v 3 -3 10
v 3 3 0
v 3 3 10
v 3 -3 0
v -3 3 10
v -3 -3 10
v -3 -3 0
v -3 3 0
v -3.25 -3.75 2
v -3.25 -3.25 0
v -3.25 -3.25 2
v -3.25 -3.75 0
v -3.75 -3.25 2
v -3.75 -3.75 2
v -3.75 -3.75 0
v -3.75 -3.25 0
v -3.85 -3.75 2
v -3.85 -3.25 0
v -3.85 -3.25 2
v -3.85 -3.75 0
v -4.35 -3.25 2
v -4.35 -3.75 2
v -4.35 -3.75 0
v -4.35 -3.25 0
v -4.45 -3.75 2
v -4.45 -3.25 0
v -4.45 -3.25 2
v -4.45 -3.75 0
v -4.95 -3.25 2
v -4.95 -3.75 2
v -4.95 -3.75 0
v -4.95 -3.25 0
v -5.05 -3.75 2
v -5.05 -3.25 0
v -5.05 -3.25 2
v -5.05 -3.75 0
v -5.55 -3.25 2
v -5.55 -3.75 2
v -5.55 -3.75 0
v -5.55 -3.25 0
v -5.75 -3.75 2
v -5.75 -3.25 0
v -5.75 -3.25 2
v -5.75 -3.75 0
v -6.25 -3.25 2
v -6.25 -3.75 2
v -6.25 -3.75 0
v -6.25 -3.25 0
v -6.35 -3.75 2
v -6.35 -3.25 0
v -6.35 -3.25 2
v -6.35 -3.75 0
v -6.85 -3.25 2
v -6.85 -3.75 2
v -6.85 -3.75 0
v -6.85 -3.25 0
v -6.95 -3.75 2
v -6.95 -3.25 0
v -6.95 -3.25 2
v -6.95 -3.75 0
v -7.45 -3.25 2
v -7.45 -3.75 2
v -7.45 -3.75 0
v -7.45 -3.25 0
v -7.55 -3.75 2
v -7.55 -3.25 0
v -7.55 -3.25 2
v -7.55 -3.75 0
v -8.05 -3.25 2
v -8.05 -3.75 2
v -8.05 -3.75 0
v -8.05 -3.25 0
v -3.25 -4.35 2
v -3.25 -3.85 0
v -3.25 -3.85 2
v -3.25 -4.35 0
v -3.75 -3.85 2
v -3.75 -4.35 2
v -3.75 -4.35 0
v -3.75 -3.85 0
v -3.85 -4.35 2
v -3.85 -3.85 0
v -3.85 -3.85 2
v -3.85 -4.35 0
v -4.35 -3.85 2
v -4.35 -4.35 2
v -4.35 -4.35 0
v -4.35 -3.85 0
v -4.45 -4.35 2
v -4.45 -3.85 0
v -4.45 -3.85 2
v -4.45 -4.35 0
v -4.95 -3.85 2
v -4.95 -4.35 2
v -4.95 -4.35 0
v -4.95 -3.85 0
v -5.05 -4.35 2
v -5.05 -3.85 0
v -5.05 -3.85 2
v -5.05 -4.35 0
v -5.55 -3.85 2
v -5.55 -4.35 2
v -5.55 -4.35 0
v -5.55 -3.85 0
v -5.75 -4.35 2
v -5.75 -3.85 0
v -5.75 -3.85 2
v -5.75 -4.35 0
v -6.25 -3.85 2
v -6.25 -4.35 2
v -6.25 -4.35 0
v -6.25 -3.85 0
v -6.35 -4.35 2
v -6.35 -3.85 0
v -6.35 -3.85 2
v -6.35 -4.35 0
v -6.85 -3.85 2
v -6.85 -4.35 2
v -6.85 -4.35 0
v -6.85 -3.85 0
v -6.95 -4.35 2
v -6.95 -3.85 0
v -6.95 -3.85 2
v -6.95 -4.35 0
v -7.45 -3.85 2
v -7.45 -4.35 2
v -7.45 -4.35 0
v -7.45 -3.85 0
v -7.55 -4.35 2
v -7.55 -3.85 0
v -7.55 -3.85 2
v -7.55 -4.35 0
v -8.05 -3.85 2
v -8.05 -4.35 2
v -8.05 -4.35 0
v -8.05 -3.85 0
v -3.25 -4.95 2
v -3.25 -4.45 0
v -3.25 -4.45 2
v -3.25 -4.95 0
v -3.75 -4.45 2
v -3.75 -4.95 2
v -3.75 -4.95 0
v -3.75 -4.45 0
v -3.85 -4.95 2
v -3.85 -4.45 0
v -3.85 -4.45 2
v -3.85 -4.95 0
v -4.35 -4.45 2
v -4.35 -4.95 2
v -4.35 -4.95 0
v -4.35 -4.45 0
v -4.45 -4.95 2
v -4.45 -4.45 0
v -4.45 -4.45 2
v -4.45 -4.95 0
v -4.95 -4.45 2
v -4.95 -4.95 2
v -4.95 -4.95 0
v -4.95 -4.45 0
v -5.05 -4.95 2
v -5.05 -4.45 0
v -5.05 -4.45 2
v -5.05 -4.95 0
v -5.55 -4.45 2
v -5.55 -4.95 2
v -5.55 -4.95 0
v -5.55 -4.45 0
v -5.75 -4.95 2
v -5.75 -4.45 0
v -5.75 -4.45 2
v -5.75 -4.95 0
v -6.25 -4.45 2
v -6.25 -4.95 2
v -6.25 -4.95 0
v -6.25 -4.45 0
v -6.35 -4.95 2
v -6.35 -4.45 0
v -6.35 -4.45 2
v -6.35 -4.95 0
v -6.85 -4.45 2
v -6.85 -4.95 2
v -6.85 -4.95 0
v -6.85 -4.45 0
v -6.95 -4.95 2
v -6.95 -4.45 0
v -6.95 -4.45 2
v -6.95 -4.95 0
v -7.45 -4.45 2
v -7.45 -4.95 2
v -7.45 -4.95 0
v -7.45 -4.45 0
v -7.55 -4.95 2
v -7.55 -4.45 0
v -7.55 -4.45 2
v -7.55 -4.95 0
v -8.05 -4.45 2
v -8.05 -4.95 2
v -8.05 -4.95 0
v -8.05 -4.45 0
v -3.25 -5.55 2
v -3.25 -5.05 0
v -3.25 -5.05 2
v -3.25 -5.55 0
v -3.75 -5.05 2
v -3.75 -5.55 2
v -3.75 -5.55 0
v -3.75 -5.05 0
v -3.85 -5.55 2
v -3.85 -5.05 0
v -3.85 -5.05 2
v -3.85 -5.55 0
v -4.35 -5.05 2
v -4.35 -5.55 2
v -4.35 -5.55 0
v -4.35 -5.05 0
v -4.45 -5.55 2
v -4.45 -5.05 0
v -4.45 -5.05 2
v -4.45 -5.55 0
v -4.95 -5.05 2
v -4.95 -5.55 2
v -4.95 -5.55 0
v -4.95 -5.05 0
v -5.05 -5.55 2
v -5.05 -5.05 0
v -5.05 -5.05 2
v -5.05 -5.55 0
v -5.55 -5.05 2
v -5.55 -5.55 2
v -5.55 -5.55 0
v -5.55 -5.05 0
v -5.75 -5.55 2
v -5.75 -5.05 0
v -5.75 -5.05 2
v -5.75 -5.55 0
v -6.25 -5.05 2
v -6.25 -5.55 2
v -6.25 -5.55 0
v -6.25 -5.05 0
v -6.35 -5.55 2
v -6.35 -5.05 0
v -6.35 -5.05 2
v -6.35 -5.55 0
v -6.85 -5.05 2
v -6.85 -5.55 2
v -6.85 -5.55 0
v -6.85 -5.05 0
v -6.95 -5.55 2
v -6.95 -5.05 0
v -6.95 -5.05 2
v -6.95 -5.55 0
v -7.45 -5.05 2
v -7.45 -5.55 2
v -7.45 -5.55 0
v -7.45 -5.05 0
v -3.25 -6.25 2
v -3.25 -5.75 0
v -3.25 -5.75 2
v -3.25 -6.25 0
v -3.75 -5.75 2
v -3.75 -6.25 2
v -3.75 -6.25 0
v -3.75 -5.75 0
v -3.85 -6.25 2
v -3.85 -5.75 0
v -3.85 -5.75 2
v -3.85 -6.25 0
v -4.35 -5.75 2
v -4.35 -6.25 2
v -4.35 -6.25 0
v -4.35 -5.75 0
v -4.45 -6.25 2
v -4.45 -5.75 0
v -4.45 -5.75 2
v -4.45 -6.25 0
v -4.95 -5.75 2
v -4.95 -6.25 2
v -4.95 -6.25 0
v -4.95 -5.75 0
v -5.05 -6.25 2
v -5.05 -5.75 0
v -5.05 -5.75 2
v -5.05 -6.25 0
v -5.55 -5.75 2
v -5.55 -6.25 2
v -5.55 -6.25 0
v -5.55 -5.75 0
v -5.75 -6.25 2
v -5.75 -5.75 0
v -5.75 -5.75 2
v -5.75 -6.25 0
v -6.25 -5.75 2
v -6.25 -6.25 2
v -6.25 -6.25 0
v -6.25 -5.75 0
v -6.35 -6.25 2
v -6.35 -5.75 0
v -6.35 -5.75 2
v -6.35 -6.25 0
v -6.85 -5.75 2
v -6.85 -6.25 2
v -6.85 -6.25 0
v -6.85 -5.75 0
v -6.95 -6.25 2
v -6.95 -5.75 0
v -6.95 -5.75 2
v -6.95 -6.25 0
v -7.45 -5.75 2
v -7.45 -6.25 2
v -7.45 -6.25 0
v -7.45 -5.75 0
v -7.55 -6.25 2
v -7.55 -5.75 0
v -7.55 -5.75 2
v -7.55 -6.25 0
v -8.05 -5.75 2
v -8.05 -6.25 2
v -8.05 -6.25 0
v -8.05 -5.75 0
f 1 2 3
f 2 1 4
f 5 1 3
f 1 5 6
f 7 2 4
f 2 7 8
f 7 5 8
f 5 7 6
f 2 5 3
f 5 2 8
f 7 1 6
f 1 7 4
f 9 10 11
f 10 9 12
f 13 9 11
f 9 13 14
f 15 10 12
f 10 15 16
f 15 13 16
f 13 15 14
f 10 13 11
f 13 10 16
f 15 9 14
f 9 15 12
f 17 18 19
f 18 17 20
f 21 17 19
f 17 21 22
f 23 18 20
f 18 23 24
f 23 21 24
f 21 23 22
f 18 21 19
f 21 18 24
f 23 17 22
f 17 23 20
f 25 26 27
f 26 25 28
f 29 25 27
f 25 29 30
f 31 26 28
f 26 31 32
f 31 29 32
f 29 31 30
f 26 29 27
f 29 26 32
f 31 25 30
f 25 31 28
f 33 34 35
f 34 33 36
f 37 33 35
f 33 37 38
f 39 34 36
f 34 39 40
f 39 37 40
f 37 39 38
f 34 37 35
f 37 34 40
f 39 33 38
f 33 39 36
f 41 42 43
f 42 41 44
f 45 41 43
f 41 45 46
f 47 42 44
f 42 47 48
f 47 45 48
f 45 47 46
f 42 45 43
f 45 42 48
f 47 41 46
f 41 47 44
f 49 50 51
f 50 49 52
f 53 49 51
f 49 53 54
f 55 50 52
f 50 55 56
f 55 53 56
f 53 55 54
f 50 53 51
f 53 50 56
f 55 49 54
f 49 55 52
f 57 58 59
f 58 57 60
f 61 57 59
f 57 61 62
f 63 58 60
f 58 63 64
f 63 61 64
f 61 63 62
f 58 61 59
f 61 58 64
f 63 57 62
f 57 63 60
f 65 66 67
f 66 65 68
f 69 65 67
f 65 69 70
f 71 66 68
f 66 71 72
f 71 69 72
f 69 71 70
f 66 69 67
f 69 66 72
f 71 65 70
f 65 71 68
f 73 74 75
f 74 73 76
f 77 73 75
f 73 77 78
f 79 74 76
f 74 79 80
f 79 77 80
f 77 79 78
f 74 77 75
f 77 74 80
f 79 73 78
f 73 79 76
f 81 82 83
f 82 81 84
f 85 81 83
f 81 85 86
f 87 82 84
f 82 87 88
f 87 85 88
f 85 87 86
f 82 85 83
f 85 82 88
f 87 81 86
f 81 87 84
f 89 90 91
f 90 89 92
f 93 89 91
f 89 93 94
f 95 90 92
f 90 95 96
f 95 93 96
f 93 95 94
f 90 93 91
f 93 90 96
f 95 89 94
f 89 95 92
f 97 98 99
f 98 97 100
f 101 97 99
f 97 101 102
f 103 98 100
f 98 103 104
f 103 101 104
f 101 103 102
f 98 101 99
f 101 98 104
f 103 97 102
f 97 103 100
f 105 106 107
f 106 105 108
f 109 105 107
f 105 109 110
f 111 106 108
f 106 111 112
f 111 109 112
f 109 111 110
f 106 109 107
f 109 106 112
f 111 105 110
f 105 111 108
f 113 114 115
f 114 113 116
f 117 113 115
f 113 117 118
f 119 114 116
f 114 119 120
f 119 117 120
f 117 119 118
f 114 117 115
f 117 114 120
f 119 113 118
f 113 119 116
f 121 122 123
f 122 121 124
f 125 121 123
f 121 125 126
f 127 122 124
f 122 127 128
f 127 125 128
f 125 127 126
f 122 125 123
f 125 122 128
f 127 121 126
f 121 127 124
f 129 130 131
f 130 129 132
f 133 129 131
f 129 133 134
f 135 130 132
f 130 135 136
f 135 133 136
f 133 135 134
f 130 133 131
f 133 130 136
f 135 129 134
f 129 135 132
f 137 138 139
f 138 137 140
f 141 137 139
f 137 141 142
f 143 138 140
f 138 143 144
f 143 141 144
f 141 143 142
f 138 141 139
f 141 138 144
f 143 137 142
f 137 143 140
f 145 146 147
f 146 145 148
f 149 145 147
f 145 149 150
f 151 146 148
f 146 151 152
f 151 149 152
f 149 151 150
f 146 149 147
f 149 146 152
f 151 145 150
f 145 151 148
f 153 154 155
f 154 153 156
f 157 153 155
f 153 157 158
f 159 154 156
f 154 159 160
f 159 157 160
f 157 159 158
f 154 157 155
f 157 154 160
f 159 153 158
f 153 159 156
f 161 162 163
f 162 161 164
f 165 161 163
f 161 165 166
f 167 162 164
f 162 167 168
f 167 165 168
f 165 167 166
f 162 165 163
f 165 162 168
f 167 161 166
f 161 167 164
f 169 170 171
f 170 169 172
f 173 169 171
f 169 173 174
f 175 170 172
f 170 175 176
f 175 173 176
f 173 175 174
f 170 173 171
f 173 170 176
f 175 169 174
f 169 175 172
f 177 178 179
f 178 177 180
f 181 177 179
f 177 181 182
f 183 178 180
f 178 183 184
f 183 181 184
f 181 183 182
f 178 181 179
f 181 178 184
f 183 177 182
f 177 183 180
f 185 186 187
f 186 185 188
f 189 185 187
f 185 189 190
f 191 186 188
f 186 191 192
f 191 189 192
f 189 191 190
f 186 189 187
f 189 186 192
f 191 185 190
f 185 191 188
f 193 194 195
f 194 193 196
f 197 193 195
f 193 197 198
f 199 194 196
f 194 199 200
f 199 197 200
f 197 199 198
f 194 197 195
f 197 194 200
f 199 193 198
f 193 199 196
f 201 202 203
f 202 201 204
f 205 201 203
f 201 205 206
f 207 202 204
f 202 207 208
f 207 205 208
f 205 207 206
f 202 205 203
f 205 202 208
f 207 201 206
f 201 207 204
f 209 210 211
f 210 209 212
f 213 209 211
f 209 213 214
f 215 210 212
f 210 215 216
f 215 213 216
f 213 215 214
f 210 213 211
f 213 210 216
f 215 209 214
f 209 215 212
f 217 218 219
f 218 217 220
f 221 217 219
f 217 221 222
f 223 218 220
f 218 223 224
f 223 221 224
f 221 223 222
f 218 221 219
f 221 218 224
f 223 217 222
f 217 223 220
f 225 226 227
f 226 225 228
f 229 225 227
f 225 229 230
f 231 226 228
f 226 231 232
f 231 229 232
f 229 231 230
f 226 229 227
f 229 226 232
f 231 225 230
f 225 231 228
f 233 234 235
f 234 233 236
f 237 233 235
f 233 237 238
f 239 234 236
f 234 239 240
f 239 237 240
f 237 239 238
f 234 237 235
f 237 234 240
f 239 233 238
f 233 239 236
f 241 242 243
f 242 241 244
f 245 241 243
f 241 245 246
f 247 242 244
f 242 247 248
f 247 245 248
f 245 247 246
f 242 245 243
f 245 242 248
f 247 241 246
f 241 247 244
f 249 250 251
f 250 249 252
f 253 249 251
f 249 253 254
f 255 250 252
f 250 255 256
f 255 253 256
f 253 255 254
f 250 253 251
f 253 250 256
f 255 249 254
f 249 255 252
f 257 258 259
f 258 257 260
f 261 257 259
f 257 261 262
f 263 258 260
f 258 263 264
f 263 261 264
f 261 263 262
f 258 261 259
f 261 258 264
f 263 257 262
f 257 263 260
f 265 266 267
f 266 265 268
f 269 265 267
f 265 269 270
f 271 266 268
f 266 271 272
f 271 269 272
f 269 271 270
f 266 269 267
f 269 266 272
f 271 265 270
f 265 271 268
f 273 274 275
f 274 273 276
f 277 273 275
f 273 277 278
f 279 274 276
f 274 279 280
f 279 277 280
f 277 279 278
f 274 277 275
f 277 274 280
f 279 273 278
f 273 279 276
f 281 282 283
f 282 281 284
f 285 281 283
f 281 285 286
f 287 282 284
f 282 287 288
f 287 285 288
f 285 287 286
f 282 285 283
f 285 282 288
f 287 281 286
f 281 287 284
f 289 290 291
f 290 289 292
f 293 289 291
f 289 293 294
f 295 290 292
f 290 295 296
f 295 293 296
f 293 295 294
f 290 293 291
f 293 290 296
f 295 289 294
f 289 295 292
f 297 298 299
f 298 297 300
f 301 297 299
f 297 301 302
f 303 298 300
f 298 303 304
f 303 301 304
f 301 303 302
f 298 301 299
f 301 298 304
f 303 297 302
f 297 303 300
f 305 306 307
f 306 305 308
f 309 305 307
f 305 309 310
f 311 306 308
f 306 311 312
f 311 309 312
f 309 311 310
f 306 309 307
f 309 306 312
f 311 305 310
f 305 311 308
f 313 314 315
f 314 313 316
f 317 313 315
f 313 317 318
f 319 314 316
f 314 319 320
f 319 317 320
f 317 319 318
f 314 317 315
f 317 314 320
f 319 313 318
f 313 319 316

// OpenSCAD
translate([0, 0, 5]) color([0,1,0,0.9]) cube([6, 6, 10], center=true);
translate([-3.5, -3.5, 1]) color([1,0,0]) cube([0.5, 0.5, 2], center=true);
translate([-4.1, -3.5, 1]) color([1,0,0]) cube([0.5, 0.5, 2], center=true);
translate([-4.7, -3.5, 1]) color([1,0,0]) cube([0.5, 0.5, 2], center=true);
translate([-5.3, -3.5, 1]) color([1,0,0]) cube([0.5, 0.5, 2], center=true);
translate([-6.0, -3.5, 1]) color([1,0,0]) cube([0.5, 0.5, 2], center=true);
translate([-6.6, -3.5, 1]) color([1,0,0]) cube([0.5, 0.5, 2], center=true);
translate([-7.2, -3.5, 1]) color([1,0,0]) cube([0.5, 0.5, 2], center=true);
translate([-7.8, -3.5, 1]) color([1,0,0]) cube([0.5, 0.5, 2], center=true);
translate([-3.5, -4.1, 1]) color([1,0,0]) cube([0.5, 0.5, 2], center=true);
translate([-4.1, -4.1, 1]) color([1,0,0]) cube([0.5, 0.5, 2], center=true);
translate([-4.7, -4.1, 1]) color([1,0,0]) cube([0.5, 0.5, 2], center=true);
translate([-5.3, -4.1, 1]) color([1,0,0]) cube([0.5, 0.5, 2], center=true);
translate([-6.0, -4.1, 1]) color([1,0,0]) cube([0.5, 0.5, 2], center=true);
translate([-6.6, -4.1, 1]) color([1,0,0]) cube([0.5, 0.5, 2], center=true);
translate([-7.2, -4.1, 1]) color([1,0,0]) cube([0.5, 0.5, 2], center=true);
translate([-7.8, -4.1, 1]) color([1,0,0]) cube([0.5, 0.5, 2], center=true);
translate([-3.5, -4.7, 1]) color([1,0,0]) cube([0.5, 0.5, 2], center=true);
translate([-4.1, -4.7, 1]) color([1,0,0]) cube([0.5, 0.5, 2], center=true);
translate([-4.7, -4.7, 1]) color([1,0,0]) cube([0.5, 0.5, 2], center=true);
translate([-5.3, -4.7, 1]) color([1,0,0]) cube([0.5, 0.5, 2], center=true);
translate([-6.0, -4.7, 1]) color([1,0,0]) cube([0.5, 0.5, 2], center=true);
translate([-6.6, -4.7, 1]) color([1,0,0]) cube([0.5, 0.5, 2], center=true);
translate([-7.2, -4.7, 1]) color([1,0,0]) cube([0.5, 0.5, 2], center=true);
translate([-7.8, -4.7, 1]) color([1,0,0]) cube([0.5, 0.5, 2], center=true);
translate([-3.5, -5.3, 1]) color([1,0,0]) cube([0.5, 0.5, 2], center=true);
translate([-4.1, -5.3, 1]) color([1,0,0]) cube([0.5, 0.5, 2], center=true);
translate([-4.7, -5.3, 1]) color([1,0,0]) cube([0.5, 0.5, 2], center=true);
translate([-5.3, -5.3, 1]) color([1,0,0]) cube([0.5, 0.5, 2], center=true);
translate([-6.0, -5.3, 1]) color([1,0,0]) cube([0.5, 0.5, 2], center=true);
translate([-6.6, -5.3, 1]) color([1,0,0]) cube([0.5, 0.5, 2], center=true);
translate([-7.2, -5.3, 1]) color([1,0,0]) cube([0.5, 0.5, 2], center=true);
translate([-3.5, -6.0, 1]) color([1,0,0]) cube([0.5, 0.5, 2], center=true);
translate([-4.1, -6.0, 1]) color([1,0,0]) cube([0.5, 0.5, 2], center=true);
translate([-4.7, -6.0, 1]) color([1,0,0]) cube([0.5, 0.5, 2], center=true);
translate([-5.3, -6.0, 1]) color([1,0,0]) cube([0.5, 0.5, 2], center=true);
translate([-6.0, -6.0, 1]) color([1,0,0]) cube([0.5, 0.5, 2], center=true);
translate([-6.6, -6.0, 1]) color([1,0,0]) cube([0.5, 0.5, 2], center=true);
translate([-7.2, -6.0, 1]) color([1,0,0]) cube([0.5, 0.5, 2], center=true);
translate([-7.8, -6.0, 1]) color([1,0,0]) cube([0.5, 0.5, 2], center=true);
